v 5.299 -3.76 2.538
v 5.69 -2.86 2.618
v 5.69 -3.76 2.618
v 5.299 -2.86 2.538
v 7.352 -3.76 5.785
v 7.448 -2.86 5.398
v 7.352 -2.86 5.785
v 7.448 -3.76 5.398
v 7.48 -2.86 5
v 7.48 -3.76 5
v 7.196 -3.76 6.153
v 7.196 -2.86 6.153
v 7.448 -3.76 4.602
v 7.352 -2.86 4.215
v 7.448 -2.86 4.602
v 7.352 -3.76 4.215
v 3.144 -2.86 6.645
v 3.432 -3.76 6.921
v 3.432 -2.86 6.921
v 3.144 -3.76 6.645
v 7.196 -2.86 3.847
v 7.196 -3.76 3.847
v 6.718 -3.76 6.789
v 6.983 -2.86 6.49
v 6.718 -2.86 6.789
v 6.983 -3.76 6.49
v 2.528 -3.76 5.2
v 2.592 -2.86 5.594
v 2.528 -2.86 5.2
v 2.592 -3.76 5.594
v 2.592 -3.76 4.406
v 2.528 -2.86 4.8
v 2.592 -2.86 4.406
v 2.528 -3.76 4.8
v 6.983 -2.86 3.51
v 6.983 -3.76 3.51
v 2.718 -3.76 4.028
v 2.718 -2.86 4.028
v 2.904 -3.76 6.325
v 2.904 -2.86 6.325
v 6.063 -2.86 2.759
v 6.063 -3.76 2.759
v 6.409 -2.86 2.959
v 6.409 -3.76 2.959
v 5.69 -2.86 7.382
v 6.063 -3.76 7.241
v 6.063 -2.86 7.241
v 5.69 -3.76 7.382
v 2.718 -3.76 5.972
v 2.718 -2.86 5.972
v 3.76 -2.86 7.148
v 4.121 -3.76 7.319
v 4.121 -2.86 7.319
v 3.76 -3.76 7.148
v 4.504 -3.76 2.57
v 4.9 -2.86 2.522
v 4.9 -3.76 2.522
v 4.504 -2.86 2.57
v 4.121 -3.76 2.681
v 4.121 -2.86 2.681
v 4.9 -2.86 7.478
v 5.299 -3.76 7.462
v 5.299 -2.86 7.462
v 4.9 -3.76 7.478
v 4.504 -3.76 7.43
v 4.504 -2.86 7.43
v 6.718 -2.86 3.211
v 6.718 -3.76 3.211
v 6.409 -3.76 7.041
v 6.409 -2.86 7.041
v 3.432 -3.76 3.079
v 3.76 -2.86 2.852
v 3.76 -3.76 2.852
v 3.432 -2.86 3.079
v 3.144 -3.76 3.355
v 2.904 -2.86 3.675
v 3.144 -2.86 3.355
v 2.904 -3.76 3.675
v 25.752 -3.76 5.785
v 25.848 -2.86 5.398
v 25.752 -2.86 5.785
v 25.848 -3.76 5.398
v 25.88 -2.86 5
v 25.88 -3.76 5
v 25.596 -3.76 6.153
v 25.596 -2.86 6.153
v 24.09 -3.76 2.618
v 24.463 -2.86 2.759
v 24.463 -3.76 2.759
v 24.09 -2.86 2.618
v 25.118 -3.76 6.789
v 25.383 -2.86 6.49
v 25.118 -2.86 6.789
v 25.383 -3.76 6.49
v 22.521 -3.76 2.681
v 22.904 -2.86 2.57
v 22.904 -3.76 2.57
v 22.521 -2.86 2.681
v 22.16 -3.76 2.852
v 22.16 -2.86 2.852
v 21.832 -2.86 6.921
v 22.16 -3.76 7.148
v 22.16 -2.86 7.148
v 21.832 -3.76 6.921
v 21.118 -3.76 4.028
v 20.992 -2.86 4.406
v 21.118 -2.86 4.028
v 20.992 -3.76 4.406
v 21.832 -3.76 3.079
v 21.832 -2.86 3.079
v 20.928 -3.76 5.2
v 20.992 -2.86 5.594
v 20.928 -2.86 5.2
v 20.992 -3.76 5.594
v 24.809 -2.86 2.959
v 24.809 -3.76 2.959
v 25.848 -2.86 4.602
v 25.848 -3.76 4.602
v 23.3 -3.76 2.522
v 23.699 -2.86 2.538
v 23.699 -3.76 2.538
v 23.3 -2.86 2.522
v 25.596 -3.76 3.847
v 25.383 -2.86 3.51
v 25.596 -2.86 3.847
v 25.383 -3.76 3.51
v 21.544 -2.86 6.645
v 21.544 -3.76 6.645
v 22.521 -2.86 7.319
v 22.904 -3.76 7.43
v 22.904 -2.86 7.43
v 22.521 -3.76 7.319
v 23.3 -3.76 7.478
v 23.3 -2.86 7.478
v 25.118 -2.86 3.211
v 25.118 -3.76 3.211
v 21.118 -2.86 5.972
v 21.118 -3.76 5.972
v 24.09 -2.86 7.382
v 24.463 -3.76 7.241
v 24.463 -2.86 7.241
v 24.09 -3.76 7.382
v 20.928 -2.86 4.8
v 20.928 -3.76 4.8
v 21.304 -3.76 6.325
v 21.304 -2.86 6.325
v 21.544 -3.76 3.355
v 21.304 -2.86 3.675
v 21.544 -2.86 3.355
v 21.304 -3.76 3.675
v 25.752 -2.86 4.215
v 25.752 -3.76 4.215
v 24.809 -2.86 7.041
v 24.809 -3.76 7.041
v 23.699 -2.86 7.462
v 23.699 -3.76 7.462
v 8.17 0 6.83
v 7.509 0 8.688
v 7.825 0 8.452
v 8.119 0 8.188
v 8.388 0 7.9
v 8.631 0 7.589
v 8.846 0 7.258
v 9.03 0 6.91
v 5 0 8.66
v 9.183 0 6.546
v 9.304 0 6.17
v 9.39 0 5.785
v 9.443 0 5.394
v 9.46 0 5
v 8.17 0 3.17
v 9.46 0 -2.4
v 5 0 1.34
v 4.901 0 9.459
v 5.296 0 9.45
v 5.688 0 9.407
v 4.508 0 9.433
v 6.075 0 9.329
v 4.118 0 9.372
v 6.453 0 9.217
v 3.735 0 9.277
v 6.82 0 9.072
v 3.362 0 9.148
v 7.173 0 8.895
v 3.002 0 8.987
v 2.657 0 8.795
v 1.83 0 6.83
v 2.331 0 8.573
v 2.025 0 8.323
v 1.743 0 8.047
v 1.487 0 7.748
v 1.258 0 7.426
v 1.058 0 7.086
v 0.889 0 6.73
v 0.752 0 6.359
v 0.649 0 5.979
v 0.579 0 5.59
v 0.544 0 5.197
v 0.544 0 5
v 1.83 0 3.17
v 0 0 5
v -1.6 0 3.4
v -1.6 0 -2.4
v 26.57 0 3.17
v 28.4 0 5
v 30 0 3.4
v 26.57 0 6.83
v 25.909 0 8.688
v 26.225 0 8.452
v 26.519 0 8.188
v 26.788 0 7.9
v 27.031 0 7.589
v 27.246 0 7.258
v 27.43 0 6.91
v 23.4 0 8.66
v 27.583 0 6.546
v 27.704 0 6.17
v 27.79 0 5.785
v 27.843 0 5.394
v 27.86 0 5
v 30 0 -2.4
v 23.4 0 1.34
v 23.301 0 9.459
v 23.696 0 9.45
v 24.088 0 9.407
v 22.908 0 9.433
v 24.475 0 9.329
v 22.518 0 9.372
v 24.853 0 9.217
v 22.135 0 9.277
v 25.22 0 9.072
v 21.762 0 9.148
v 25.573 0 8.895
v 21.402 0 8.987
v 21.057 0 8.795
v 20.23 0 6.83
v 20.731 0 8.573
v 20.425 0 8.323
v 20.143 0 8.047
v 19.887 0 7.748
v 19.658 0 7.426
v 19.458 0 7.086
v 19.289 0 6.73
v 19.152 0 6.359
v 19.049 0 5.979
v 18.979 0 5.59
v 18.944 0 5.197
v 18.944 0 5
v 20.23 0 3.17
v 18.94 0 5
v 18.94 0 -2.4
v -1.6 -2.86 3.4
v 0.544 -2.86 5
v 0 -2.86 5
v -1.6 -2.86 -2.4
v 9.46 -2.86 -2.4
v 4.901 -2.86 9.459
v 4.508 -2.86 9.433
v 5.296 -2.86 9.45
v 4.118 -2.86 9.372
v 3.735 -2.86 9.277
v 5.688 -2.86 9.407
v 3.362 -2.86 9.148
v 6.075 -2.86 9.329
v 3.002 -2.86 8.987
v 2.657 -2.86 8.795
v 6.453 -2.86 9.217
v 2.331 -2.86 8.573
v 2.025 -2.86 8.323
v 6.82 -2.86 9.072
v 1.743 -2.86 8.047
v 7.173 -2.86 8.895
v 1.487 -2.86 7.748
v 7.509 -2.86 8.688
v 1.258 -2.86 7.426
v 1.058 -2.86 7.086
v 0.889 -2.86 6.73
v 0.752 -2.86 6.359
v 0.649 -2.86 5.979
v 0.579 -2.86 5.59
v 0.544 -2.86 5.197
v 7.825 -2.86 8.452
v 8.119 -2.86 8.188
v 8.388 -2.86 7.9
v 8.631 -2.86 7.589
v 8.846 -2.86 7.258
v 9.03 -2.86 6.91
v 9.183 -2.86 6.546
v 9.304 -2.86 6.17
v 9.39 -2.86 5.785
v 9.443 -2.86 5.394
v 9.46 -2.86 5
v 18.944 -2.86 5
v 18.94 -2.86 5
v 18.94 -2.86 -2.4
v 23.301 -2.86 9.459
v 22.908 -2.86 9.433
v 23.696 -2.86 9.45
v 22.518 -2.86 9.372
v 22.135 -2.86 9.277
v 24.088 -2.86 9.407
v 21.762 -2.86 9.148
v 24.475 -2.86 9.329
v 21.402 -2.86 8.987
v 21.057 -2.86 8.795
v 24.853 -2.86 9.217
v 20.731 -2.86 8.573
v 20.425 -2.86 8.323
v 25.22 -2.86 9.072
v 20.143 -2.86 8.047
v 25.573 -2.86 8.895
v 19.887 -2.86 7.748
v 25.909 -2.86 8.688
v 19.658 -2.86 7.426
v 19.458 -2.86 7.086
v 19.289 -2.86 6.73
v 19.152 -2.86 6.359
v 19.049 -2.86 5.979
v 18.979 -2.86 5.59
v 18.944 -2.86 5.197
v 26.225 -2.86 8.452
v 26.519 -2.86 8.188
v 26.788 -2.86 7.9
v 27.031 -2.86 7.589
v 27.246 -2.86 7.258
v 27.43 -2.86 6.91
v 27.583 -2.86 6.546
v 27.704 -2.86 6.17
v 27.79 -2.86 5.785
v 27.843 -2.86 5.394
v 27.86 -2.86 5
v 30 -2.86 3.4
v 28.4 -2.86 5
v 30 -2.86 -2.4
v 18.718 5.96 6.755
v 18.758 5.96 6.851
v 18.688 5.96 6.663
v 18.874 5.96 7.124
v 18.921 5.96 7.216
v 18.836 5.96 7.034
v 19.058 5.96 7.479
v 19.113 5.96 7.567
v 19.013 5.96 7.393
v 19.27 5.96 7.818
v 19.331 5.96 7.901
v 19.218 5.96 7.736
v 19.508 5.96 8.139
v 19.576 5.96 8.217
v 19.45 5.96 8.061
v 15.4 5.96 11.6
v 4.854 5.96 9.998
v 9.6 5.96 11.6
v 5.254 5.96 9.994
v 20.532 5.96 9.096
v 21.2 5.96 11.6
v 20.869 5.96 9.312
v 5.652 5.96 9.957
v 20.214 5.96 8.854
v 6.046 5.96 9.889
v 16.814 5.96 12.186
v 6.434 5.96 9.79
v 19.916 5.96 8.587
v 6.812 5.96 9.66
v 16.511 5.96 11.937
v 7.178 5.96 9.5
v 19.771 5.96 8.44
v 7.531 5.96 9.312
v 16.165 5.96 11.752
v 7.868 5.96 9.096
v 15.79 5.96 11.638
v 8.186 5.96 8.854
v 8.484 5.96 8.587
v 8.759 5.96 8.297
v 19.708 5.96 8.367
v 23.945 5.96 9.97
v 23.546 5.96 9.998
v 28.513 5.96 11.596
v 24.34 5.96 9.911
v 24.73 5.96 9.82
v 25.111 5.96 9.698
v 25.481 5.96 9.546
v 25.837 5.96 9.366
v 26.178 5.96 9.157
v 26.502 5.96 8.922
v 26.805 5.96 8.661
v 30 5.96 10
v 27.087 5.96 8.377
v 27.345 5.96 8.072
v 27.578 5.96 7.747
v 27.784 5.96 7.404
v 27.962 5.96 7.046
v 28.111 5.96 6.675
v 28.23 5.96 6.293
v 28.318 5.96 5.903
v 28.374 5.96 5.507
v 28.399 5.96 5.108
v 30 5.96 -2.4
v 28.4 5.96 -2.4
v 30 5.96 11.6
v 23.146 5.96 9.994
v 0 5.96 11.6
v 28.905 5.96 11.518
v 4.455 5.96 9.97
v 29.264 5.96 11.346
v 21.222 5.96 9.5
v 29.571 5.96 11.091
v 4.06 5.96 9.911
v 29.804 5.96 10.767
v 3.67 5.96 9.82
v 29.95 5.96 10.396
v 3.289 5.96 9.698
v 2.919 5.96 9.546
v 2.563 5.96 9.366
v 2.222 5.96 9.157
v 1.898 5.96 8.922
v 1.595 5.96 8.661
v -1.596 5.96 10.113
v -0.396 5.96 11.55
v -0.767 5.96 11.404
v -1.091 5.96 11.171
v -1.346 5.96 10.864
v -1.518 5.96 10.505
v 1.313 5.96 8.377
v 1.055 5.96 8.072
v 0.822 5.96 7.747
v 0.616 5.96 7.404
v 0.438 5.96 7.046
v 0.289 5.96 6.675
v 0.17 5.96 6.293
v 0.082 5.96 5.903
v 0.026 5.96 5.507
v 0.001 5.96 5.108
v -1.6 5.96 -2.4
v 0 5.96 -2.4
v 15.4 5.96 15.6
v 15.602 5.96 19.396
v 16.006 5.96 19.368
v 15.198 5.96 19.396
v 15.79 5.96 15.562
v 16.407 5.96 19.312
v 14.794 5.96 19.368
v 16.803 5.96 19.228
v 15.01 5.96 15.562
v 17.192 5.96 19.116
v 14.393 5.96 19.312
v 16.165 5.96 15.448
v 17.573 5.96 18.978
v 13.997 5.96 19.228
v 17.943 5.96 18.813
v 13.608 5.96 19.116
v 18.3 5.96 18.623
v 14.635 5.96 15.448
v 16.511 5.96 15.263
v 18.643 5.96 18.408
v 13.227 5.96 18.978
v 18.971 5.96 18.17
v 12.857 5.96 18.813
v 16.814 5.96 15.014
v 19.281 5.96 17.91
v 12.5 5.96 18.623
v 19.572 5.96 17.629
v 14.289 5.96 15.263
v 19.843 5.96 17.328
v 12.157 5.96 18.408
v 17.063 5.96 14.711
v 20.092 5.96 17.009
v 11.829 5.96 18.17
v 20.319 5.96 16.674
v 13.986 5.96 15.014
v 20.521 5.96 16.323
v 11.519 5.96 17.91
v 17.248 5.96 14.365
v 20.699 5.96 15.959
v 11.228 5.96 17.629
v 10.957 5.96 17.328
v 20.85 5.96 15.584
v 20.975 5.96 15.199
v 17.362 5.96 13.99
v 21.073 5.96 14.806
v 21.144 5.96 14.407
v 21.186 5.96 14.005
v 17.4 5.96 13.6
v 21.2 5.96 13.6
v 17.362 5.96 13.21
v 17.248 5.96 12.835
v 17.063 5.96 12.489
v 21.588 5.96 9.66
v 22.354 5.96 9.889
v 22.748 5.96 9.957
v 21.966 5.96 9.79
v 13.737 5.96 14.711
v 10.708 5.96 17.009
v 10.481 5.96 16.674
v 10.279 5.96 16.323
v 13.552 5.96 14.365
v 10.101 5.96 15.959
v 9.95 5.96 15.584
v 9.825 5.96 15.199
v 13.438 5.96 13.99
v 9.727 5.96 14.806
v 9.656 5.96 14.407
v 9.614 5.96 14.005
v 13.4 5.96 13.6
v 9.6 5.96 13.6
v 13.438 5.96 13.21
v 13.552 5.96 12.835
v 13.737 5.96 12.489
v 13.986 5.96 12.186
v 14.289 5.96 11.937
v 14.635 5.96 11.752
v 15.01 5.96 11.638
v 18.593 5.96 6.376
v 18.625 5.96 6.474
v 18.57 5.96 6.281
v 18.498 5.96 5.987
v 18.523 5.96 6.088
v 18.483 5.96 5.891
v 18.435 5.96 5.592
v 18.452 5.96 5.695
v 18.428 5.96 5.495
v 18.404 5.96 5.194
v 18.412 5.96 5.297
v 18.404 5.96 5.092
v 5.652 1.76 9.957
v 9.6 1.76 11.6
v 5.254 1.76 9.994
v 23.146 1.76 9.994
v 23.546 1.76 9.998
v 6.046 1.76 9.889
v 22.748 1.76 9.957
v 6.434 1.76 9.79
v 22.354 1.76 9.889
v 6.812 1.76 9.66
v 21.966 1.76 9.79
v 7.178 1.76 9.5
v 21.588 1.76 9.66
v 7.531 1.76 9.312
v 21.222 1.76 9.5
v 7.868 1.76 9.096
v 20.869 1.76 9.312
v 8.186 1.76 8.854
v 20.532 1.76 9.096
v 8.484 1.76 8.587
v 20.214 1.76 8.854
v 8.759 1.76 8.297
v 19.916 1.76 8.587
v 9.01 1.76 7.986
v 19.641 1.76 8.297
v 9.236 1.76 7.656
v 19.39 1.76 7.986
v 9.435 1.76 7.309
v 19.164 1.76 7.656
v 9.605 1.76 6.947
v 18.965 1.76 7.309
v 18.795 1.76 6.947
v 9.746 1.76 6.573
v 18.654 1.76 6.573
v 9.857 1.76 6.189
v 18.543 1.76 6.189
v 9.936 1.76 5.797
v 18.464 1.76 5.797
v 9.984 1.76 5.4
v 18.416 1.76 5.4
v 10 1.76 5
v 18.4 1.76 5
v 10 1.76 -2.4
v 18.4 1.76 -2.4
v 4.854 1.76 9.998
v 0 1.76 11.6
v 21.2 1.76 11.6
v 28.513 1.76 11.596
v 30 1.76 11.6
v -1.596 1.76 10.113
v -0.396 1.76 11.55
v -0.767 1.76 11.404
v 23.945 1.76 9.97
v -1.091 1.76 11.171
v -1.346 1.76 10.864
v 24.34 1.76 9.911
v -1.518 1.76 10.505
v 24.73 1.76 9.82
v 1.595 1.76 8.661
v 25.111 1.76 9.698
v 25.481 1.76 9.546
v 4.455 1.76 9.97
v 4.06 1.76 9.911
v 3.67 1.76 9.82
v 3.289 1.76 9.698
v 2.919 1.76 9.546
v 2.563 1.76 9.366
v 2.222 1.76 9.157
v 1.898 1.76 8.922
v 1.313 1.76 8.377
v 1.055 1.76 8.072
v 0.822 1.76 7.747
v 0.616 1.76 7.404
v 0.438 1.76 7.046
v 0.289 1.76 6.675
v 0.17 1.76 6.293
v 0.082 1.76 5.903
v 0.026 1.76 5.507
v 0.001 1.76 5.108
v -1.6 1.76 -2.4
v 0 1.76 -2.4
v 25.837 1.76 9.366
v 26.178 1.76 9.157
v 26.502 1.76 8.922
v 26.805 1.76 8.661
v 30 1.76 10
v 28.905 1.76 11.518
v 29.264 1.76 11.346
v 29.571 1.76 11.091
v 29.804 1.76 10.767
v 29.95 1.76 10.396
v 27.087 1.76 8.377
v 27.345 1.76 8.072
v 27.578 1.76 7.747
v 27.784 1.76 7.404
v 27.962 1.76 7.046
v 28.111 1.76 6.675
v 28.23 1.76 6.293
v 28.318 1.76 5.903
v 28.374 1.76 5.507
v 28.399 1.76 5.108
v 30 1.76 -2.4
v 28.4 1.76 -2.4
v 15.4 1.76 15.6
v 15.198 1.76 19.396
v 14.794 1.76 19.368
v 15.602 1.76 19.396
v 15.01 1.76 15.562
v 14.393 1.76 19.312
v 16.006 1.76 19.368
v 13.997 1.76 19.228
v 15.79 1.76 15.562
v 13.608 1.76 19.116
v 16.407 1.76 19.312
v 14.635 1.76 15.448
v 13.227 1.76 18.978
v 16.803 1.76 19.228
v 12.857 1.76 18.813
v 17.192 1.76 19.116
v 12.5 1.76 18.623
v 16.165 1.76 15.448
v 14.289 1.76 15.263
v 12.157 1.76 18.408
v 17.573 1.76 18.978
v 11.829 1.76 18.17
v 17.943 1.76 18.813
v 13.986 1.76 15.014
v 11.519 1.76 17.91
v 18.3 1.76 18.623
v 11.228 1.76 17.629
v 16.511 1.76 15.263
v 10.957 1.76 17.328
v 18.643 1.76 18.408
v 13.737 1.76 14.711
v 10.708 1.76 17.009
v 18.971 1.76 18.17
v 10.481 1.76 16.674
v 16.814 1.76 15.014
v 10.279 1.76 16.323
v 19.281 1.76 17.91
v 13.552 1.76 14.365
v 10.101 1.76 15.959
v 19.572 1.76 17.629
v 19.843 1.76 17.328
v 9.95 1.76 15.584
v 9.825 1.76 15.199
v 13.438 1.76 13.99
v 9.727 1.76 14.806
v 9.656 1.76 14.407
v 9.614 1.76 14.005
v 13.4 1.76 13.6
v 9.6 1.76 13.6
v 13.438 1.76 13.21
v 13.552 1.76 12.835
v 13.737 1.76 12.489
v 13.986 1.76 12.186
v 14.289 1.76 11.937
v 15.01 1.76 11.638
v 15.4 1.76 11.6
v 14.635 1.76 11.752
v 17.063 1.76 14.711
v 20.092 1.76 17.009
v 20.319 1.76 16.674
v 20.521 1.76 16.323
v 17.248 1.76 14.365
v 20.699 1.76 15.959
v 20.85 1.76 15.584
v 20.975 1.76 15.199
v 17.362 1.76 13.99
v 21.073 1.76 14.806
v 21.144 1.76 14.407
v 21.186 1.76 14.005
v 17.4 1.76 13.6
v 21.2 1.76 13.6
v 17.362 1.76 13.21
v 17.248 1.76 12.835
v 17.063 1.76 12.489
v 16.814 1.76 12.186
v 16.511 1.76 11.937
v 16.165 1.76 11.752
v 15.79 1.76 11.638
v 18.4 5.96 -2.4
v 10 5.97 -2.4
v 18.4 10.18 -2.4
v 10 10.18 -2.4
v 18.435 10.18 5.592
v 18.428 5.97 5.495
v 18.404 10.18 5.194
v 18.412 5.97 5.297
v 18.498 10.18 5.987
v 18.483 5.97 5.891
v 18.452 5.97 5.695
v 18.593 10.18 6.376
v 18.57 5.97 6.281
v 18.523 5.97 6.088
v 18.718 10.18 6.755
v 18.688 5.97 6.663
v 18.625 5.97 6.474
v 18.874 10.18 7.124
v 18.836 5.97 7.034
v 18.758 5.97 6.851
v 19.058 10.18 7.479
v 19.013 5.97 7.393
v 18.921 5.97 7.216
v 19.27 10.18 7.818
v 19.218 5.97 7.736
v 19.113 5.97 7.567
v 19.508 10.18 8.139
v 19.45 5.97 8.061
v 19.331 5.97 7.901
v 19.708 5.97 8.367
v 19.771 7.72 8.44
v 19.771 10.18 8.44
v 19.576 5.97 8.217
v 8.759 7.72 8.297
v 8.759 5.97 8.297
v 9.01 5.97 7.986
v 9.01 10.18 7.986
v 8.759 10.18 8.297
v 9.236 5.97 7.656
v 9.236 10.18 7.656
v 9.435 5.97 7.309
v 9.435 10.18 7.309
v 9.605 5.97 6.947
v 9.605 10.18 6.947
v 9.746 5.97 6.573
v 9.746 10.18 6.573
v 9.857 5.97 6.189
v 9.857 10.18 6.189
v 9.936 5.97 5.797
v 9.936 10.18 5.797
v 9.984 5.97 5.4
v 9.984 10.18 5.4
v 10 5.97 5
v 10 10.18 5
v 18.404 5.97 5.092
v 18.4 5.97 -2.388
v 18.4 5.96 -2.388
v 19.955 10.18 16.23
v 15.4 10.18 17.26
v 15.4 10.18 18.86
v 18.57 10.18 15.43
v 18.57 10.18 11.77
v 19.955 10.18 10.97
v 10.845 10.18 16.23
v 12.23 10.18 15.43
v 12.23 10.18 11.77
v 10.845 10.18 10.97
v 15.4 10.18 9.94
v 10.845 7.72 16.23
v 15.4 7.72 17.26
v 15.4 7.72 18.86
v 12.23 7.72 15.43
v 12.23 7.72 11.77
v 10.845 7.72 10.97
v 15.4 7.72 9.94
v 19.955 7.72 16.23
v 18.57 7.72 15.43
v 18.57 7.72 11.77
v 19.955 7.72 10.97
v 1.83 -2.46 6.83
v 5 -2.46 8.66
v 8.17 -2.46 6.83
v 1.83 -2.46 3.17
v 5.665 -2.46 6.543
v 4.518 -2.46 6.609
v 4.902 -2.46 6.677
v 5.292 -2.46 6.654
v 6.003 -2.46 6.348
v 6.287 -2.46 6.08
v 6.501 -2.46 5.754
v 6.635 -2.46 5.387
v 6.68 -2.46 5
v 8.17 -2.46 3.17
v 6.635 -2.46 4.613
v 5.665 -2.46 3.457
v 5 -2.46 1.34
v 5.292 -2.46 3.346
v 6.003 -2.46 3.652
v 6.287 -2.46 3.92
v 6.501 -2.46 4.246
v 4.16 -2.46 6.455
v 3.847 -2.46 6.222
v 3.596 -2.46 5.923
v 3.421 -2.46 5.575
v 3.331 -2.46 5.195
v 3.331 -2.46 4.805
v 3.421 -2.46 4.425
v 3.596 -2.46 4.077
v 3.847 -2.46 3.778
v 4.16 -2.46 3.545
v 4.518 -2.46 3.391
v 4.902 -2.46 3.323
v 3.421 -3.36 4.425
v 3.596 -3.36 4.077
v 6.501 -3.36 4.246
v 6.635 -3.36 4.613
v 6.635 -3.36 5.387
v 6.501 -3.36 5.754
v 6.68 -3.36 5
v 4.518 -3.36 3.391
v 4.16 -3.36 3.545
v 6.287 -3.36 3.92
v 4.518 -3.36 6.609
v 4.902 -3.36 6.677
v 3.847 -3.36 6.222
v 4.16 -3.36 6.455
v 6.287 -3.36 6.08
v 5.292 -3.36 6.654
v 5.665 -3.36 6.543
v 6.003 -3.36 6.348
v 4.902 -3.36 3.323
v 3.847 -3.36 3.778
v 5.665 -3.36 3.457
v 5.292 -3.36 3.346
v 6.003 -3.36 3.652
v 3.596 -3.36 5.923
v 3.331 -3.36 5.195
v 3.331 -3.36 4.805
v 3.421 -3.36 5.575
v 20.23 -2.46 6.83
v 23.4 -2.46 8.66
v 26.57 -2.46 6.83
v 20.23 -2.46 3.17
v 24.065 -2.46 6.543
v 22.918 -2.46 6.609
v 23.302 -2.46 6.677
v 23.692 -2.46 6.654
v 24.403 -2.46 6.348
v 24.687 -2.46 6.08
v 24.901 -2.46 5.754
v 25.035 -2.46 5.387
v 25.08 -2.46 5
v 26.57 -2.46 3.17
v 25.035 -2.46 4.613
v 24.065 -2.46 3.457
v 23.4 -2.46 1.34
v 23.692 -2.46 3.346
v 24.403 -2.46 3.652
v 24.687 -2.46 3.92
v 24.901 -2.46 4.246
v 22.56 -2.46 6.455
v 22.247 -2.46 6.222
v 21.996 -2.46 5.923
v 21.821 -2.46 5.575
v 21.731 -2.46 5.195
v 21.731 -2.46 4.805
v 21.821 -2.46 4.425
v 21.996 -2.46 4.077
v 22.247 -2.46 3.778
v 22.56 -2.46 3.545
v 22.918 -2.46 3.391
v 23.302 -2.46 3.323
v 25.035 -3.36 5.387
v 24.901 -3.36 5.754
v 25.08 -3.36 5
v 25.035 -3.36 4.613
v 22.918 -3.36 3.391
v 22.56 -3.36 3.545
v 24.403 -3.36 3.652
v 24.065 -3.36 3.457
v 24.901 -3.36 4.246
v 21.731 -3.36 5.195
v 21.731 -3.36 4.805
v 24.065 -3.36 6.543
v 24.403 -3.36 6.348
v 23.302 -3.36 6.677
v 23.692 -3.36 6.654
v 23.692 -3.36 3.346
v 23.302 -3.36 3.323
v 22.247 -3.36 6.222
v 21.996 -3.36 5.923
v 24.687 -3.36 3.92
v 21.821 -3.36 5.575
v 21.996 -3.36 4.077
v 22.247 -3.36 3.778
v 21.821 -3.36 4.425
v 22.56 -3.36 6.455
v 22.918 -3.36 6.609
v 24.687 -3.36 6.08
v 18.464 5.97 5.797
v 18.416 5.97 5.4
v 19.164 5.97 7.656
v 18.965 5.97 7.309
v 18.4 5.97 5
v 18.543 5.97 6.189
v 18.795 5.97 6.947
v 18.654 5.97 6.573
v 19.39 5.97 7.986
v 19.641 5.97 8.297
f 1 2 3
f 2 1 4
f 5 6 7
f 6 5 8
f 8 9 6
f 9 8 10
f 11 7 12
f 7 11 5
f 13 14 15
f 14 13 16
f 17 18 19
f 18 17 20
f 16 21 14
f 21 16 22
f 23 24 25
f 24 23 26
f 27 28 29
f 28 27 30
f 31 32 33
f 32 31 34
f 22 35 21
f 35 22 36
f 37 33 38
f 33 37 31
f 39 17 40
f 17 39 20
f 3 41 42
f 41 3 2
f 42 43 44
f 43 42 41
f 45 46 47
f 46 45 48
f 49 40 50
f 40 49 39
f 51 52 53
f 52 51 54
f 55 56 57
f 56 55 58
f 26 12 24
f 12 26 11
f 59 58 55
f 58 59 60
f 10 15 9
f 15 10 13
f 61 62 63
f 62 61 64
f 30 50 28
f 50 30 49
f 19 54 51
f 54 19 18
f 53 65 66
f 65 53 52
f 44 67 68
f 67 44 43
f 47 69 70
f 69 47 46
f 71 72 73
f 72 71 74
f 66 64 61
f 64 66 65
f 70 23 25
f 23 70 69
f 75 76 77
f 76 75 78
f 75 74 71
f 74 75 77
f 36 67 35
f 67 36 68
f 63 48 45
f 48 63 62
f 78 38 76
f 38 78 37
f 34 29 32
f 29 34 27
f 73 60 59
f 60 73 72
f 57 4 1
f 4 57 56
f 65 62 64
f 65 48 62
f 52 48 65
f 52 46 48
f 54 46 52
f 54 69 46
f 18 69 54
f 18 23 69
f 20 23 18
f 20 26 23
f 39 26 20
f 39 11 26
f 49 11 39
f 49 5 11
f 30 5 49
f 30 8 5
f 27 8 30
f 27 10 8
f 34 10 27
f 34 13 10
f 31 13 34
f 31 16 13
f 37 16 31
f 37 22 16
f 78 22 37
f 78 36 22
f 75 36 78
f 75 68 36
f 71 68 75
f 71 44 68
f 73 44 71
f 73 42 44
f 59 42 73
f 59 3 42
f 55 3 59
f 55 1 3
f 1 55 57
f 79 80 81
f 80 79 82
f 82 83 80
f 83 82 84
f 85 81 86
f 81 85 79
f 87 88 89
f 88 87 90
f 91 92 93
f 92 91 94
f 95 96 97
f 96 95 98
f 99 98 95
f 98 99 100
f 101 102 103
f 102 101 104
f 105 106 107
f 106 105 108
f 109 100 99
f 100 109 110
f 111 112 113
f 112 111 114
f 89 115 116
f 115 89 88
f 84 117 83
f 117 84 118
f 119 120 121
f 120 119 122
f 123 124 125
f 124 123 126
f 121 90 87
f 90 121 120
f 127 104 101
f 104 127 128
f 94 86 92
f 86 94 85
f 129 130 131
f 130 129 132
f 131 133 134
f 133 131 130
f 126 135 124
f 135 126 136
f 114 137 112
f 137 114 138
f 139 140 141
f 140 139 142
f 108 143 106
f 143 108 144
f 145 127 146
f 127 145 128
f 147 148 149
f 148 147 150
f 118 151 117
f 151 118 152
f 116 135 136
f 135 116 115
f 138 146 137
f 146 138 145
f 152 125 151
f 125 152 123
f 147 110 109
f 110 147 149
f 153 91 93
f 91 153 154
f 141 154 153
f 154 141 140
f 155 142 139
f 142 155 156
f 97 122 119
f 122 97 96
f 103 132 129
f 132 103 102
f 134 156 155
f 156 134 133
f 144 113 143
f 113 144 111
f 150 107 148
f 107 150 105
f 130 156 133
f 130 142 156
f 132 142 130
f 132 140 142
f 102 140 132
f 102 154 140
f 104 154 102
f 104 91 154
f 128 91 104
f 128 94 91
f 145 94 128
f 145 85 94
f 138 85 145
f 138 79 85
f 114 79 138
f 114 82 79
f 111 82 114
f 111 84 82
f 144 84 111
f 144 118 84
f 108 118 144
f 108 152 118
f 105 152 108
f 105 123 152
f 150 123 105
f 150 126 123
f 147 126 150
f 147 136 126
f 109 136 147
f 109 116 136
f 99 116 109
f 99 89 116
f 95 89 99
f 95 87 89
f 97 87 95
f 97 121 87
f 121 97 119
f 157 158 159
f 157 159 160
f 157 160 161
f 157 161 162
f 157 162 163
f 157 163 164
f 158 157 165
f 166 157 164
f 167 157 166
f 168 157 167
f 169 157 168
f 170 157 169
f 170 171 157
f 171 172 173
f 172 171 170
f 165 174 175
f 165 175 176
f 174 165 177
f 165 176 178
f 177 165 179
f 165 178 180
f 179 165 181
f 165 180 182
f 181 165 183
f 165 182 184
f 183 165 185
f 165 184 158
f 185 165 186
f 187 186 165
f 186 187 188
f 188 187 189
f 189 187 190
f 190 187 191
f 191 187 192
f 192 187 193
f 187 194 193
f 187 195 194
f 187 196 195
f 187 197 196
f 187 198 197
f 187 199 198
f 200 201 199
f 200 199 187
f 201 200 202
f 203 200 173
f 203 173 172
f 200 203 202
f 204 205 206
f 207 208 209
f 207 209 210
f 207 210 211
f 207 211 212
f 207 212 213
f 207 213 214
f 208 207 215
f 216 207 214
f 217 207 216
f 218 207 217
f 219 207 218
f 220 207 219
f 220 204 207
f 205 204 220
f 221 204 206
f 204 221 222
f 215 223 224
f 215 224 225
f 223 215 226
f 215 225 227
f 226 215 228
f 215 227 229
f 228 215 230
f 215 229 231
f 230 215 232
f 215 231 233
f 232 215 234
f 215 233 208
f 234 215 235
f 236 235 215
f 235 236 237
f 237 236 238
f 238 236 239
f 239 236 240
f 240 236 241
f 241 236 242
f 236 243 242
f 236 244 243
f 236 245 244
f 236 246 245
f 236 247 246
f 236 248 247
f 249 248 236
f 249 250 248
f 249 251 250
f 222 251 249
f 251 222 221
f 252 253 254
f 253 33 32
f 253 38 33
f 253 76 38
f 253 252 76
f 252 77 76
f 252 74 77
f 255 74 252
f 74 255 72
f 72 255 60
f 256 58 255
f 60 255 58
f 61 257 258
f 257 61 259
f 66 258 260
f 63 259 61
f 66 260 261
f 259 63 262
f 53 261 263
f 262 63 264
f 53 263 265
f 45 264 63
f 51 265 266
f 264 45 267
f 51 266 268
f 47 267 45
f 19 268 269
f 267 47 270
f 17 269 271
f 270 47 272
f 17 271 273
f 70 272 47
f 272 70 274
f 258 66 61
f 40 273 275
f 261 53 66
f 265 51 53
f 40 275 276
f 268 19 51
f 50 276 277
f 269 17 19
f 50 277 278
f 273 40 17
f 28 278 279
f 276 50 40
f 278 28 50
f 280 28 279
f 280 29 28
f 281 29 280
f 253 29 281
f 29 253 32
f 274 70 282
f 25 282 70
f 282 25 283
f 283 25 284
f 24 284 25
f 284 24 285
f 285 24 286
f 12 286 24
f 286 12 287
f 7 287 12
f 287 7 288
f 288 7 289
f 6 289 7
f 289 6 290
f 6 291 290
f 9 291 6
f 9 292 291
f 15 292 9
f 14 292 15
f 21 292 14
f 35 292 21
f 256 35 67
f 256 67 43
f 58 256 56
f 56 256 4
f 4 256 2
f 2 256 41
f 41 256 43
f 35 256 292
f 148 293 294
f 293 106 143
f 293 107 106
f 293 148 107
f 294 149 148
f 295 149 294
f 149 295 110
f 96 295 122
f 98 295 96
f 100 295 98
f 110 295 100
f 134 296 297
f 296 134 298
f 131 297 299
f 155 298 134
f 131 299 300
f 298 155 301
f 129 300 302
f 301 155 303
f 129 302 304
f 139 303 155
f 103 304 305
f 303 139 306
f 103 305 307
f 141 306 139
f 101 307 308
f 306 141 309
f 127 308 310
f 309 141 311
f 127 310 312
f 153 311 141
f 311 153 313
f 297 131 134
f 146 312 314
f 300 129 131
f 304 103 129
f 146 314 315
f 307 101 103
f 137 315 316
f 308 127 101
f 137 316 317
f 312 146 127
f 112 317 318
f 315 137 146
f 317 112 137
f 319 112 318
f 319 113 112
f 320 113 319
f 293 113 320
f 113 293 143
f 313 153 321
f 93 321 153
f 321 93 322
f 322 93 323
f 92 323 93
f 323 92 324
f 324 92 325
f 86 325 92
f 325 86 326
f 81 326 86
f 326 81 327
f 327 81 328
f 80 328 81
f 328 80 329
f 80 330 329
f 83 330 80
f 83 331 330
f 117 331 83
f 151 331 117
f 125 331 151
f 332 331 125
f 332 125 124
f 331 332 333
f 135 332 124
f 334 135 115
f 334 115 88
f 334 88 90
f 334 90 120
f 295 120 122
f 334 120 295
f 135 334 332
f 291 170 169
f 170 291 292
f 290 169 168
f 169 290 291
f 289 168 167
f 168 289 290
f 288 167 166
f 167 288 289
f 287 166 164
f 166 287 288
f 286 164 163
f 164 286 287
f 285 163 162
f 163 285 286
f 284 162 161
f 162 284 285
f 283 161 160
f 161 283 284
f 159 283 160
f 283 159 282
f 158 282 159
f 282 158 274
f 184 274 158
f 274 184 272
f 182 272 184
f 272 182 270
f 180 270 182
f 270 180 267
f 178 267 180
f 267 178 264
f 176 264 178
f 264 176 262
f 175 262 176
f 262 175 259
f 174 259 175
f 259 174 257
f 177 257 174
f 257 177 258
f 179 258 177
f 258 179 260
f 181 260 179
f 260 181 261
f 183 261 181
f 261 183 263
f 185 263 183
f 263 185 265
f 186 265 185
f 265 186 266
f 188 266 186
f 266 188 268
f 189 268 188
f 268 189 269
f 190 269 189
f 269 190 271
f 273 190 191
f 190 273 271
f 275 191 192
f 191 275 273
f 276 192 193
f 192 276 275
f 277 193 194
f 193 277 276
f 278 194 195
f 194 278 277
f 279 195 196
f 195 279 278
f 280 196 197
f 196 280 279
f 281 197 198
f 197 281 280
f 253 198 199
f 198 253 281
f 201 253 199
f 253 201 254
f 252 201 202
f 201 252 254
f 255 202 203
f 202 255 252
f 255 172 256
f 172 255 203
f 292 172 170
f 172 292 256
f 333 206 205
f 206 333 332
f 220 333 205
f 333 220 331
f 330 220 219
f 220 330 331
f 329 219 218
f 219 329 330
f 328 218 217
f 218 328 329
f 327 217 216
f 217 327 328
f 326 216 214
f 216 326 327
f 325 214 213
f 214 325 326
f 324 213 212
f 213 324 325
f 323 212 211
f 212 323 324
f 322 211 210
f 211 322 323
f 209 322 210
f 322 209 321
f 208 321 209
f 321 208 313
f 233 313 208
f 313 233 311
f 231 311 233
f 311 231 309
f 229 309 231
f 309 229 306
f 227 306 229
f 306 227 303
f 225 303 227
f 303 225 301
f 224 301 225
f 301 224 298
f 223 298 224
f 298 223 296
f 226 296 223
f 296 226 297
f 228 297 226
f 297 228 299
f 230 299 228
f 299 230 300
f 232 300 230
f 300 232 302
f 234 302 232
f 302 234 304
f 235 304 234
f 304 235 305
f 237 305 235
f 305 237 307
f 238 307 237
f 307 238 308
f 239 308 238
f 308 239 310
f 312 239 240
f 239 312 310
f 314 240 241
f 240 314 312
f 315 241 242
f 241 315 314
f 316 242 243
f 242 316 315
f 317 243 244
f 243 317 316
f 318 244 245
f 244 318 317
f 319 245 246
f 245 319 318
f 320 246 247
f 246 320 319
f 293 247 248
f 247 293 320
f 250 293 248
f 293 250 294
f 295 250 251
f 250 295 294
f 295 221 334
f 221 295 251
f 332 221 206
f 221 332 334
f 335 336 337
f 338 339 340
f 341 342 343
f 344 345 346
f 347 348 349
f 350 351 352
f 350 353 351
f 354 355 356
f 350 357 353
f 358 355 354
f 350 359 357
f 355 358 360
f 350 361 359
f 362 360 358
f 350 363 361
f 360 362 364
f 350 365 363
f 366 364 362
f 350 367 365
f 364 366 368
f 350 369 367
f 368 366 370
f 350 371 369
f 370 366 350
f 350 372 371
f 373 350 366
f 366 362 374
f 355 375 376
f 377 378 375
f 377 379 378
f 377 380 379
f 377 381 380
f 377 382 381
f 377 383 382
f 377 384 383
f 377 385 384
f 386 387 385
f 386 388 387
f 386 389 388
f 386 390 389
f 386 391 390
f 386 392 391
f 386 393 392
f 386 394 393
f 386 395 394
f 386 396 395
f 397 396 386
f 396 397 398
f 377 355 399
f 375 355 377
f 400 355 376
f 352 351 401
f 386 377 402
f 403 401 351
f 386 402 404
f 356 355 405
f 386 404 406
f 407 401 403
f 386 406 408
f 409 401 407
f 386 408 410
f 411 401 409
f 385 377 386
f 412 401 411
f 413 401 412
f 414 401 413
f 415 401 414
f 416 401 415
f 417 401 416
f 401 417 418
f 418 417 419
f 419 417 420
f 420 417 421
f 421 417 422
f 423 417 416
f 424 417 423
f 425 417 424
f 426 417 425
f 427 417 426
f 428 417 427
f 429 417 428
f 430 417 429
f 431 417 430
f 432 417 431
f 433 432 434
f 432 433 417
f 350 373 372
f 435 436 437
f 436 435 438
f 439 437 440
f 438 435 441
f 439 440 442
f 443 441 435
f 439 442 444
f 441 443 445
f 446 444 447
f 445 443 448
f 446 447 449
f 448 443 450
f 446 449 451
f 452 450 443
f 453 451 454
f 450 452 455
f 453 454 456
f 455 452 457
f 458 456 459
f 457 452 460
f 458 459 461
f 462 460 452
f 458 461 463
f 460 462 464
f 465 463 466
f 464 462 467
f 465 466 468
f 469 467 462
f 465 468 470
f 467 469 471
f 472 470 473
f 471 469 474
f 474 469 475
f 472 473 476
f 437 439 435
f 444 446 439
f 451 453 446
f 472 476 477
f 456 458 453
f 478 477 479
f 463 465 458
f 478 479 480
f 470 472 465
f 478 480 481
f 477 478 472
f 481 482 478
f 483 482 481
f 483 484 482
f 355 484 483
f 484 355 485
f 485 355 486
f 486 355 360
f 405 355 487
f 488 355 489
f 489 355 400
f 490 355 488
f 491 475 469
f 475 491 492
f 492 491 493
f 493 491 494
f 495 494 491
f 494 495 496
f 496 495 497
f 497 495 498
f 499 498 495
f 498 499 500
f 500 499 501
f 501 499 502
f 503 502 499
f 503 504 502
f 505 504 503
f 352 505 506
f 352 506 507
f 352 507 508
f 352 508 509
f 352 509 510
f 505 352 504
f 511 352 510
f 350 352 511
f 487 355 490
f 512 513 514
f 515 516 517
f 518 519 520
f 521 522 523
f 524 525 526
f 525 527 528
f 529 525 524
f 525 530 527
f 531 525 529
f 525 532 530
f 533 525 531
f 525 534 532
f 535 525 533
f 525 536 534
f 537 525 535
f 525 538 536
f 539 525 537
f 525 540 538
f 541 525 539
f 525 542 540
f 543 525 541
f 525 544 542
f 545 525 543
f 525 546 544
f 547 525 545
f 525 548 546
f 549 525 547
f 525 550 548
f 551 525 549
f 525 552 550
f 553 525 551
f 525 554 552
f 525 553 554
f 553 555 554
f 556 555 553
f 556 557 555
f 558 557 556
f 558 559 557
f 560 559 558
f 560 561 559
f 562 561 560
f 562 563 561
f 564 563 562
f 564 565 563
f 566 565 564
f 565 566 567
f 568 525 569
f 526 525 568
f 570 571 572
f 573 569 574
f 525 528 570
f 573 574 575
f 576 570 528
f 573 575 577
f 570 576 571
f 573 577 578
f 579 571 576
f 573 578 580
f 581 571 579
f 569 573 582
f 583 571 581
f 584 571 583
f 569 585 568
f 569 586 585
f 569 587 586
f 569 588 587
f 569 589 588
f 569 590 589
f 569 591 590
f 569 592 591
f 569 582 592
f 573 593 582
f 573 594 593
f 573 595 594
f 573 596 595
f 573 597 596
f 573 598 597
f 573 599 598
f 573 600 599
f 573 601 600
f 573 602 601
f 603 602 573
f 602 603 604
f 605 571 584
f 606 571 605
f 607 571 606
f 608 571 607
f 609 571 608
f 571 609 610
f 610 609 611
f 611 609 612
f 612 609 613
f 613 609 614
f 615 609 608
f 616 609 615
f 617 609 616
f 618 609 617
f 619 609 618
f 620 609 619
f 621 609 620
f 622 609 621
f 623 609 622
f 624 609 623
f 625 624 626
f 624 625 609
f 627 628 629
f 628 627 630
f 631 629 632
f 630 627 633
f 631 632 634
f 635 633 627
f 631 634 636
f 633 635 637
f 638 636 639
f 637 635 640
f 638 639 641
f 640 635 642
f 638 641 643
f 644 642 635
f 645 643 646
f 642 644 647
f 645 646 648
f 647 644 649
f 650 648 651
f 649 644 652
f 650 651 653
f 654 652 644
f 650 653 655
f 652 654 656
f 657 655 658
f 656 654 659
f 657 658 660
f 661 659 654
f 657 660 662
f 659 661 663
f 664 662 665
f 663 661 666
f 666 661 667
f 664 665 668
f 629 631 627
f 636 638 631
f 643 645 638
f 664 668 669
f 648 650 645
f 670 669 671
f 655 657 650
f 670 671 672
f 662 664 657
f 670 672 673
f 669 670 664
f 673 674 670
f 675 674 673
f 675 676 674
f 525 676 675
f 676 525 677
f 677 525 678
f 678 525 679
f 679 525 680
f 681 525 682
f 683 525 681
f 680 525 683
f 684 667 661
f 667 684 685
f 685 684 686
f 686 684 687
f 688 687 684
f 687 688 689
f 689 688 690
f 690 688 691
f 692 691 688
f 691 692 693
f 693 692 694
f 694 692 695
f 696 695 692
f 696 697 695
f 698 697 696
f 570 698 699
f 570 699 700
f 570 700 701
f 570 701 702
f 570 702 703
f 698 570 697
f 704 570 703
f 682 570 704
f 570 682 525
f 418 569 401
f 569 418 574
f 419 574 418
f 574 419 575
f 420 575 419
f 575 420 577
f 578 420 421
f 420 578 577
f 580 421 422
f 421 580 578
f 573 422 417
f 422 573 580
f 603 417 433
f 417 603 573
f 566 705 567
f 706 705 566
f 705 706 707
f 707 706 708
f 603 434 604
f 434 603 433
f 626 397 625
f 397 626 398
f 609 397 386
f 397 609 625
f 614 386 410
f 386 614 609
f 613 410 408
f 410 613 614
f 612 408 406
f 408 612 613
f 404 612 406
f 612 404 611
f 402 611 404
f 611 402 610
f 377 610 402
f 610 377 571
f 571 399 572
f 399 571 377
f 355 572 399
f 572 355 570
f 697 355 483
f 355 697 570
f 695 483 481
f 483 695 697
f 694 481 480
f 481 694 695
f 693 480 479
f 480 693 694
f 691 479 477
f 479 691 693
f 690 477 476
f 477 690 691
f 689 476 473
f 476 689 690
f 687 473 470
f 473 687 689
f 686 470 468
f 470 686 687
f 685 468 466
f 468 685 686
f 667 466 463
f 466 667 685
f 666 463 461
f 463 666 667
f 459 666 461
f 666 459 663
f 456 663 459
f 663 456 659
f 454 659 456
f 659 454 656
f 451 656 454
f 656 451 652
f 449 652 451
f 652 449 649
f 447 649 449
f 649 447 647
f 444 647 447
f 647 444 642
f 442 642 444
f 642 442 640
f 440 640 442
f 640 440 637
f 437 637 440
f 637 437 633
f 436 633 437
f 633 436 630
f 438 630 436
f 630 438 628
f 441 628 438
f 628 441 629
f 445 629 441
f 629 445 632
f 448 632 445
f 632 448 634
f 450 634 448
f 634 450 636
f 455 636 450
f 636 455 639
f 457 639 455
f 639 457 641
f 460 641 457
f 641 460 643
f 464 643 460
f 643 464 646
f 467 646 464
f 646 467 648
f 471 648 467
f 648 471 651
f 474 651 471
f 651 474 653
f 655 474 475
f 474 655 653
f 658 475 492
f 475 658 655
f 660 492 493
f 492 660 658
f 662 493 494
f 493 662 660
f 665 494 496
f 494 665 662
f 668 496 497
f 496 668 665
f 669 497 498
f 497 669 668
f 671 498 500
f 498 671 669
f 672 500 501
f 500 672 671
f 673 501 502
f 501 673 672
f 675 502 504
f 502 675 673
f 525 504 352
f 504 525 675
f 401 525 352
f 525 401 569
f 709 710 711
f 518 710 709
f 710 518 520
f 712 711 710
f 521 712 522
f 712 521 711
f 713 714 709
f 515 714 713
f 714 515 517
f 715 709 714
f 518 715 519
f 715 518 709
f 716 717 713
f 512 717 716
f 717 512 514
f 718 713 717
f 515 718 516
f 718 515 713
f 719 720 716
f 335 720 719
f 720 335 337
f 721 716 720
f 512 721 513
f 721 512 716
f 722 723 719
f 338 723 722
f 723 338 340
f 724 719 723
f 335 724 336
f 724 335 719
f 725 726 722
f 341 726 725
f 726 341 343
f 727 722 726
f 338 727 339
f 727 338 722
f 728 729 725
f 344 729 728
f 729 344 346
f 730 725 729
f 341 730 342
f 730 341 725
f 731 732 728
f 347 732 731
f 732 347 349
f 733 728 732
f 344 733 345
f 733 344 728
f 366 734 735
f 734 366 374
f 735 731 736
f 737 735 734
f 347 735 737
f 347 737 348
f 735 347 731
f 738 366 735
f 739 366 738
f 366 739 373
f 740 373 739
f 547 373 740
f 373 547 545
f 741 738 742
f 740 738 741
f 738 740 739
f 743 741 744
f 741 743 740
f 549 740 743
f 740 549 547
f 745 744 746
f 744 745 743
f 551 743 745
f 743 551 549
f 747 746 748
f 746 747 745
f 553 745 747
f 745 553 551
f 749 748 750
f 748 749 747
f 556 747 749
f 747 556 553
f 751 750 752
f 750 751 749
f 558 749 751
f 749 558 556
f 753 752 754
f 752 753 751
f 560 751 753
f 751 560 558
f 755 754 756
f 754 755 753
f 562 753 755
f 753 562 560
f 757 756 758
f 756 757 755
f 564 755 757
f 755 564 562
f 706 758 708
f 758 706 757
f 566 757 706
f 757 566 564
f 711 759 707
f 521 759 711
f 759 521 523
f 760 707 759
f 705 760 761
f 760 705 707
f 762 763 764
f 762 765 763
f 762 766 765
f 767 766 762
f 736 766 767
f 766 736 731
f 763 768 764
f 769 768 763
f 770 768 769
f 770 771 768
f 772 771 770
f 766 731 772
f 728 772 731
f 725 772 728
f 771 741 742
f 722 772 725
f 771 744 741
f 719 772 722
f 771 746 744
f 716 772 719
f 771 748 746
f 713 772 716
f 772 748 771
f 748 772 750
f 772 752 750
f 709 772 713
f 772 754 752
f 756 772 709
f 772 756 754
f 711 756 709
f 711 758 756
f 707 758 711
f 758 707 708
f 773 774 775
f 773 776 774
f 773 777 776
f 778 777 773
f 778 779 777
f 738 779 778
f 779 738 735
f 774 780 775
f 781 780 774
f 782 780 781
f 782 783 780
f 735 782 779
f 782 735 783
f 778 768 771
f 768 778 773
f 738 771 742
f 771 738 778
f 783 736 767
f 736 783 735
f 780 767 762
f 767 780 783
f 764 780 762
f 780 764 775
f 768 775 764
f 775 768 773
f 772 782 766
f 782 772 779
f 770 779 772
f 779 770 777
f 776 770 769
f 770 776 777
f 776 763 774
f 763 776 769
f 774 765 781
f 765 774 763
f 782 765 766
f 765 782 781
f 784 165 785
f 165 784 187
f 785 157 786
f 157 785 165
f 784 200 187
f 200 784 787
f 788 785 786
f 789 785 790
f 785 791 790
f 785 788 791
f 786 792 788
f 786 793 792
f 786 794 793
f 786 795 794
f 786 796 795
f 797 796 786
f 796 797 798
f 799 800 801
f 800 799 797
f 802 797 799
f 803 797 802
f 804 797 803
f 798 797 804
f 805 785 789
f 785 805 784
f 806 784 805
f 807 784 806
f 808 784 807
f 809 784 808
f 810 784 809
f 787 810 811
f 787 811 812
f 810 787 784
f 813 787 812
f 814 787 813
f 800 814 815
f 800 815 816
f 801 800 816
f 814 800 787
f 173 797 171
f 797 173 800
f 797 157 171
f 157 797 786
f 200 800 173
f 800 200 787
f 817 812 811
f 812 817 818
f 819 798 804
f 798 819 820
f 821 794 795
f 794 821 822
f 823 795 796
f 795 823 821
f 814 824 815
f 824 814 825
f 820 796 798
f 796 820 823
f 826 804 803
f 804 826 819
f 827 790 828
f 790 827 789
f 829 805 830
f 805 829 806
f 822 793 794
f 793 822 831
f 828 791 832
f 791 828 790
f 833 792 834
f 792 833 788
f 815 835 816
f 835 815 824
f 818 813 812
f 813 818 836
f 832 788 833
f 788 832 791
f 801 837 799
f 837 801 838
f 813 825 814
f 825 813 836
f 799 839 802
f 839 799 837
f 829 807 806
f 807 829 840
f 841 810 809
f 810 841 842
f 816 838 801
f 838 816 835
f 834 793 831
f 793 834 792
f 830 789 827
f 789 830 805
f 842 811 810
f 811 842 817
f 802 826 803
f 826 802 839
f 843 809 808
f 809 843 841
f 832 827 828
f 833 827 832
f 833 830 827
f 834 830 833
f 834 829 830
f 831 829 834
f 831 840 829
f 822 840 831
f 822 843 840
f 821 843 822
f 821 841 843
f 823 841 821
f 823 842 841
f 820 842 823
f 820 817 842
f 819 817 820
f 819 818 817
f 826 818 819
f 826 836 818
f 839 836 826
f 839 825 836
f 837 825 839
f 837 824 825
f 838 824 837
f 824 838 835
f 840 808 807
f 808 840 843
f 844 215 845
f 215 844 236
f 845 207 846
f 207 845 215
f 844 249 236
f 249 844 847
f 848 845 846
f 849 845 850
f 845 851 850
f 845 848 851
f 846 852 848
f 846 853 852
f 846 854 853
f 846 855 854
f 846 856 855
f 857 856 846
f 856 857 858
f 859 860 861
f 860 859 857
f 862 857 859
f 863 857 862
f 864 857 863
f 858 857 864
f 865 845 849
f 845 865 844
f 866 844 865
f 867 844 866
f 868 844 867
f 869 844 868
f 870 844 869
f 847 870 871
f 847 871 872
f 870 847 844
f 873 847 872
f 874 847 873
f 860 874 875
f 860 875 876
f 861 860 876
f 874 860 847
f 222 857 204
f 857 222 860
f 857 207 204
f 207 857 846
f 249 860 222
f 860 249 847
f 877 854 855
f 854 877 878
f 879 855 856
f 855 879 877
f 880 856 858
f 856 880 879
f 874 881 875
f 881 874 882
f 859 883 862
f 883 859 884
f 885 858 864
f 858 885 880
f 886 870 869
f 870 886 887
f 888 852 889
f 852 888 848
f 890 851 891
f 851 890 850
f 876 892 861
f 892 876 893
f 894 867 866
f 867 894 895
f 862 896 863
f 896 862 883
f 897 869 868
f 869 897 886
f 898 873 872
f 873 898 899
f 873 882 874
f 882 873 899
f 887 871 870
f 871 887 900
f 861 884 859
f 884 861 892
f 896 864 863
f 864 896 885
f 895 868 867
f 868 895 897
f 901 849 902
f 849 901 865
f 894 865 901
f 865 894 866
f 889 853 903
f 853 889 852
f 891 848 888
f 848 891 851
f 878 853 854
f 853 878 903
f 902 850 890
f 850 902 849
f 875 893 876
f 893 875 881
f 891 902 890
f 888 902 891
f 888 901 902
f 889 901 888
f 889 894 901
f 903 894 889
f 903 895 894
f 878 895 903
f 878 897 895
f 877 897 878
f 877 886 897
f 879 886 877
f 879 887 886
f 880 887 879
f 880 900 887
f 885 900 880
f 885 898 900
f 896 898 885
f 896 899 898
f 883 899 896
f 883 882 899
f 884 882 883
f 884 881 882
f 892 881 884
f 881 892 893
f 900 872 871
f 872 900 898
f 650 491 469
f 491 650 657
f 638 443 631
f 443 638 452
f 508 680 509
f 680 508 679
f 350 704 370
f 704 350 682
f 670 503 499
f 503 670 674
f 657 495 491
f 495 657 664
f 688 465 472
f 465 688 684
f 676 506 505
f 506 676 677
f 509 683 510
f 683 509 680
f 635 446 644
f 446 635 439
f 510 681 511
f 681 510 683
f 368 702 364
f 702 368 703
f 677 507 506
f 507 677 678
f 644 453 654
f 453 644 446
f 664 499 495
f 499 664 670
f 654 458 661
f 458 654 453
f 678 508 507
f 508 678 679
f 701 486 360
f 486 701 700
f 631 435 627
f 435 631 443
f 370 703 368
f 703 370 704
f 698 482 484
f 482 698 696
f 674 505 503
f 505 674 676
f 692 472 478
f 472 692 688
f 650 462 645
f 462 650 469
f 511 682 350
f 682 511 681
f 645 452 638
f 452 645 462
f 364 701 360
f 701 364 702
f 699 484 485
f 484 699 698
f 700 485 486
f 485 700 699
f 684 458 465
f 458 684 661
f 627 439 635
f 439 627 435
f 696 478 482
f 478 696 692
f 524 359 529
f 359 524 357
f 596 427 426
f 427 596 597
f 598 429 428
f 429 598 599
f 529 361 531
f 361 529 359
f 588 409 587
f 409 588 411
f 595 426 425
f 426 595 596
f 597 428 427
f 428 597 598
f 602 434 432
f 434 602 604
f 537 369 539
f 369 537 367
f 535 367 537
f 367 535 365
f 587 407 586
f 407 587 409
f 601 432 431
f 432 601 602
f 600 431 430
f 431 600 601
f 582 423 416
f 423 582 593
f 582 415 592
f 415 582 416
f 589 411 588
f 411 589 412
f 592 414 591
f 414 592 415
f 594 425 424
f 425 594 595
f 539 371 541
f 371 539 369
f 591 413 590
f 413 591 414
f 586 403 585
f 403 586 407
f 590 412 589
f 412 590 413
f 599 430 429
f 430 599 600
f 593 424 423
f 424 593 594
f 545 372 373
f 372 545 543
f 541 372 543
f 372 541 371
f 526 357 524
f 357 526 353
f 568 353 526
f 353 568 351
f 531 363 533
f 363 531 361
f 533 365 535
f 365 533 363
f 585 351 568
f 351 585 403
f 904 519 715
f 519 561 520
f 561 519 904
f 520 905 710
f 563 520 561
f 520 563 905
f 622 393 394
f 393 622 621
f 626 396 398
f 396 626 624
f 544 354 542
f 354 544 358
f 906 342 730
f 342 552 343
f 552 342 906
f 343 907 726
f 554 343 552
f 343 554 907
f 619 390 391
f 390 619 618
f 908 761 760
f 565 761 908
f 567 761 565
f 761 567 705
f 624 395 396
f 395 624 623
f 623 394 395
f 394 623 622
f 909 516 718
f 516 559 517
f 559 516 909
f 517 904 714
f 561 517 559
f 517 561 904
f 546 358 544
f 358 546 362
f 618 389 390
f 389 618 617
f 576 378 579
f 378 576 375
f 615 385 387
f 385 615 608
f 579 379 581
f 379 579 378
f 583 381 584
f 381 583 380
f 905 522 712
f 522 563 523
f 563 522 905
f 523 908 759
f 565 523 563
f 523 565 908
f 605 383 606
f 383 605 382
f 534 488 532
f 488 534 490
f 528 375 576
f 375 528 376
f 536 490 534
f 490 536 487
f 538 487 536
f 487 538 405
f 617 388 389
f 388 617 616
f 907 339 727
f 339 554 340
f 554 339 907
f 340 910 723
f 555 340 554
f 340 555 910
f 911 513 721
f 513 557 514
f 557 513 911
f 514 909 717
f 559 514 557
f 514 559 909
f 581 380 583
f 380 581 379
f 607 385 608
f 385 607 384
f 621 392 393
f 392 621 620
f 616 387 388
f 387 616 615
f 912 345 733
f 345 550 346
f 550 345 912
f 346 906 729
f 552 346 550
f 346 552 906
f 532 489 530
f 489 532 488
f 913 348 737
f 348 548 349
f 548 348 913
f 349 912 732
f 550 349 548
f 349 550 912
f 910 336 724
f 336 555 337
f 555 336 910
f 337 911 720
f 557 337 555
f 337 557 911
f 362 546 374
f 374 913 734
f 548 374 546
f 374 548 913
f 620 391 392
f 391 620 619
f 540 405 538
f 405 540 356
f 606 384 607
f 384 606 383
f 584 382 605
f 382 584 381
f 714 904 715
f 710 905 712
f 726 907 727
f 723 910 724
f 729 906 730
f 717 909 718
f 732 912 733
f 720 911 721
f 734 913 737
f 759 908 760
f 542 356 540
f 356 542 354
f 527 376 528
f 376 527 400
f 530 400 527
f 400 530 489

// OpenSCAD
// Copyright (C) 2025 Arif K. Rafiq
// This program is free software: you can redistribute it and/or modify
// it under the terms of the GNU General Public License as published by
// the Free Software Foundation, either version 3 of the License, or
// (at your option) any later version.

// This program is distributed in the hope that it will be useful,
// but WITHOUT ANY WARRANTY; without even the implied warranty of
// MERCHANTABILITY or FITNESS FOR A PARTICULAR PURPOSE.  See the
// GNU General Public License for more details.

// You should have received a copy of the GNU General Public License
// along with this file.  If not, see <https://www.gnu.org/licenses/>,
// or write to: license@temperedoptimism.com


/* 
(b)readth       :(w)est (X-)   (c)enter (X0) (e)east (X+)
(h)eight        :(d)own (Z-)   (g)round(Z0)  (u)p (Z+)

Vectors (v)     :(x), (y), (z)
Thicknesses (t) : Thicknesses to resolve 3D printer limits or rendering issues.
Proportion (p)  : container for grouping (r)adius and (i)ntensity into a singl 2d vector acccessed using .x and .y respectively
*/
/* 17:08 */
// Fixed in example3.scad       // Set limits in customizer
/* [Thicknesses (x),(y),(z)] */
tFitGap = [0.16, 0.16, 0.16];   //[0.00:0.01:0.64] 
tWallMin = [0.40, 0.40, 0.16];  //[0.16:0.08:1.60] 
/* [Proportional (x):(Radius, (y):(i)ntensity] */
pHexSink = [3.5, 2.3];          //[0.10:0.02:20.00] 
pFastShaft064 = [1.36, 5.80]; //0.10:0.02:20.00]
pFastShaft095 = [1.36, 9.30]; //0.10:0.02:20.00]
pWashSink = [4.00, 1.00]; //0.10:0.02:20.00]
/* [2D vectors (x), (y)] */
vTerminalW = [5.0, 5.0];     //[0.00:0.10:100] 
vTerminalE = [23.4, 5.0];    //[0.00:0.10:100]
vThermal = [ 15.4, 13.6];    //[0.00:0.10:100.00]
/* [Scalars] */
yControllerThermal=5.0; //[5.0:0.1:8.4]
leadingEdge = 2.4; //[0.8:0.4:5.0]
flankEdge = 1.6; //[0.8:0.4:5.0]
trailingEdge = 1.6; //[0.8:0.4:3.6]
hBoardDriver = 28.4; //[20:0.1:100.0]
hBoard = 1.6; //0.8:04:3.2]
hBoardController = 1.6; //[0.8:04:3.2]
// Adding space
hSpacer = 4.2; //[2.8:0.4:14]
rCorner = 1.6; //0.1
rTerminal = 5.0; //0.1
rThermal = 5.0;  //0.1
/* [Special ] */
fa0 = 4.0;     //[1:1:60]  
fs0 = 0.4;     //[0.1:0.1:4.0]  
fx0 = 3;       //[1,2,3,4,5,6,7,8,9,10]
/* [Hidden] */ 
tEps=0.01; 

/* Calucualted at run time. */
pHexSurround = [pHexSink.x + (tWallMin.x * 2) + tFitGap.x, pHexSink.y + tWallMin.y + tFitGap.y];
pExtension = [pFastShaft064.x + ((tWallMin.x + tFitGap.x)* 2), pFastShaft064.y + tWallMin.y + tFitGap.y - pHexSurround.y -hBoard - pWashSink.y];
aControllerRest= asin((vThermal.y - yControllerThermal - tFitGap.z - vTerminalW.y)/rThermal);

//30.00-35.00 Circles, Also look at the customizer!!
// Rotate
rotate([90,0,0]){
  difference(){
    union() {
      // hex pocket surround
      linear_extrude(pHexSurround.y, convexity=fx0){ 
        polygon([[vTerminalW.x + pHexSurround.x, vTerminalW.y],
              [ vTerminalW.x + pHexSurround.x, -leadingEdge],
              [-flankEdge, -leadingEdge],
              [-flankEdge, vTerminalW.y - rCorner],
              [-flankEdge + rCorner, vTerminalW.y]]);
        polygon([[vTerminalE.x - pHexSurround.x, vTerminalE.y],
              [ vTerminalE.x - pHexSurround.x, -leadingEdge],
              [hBoardDriver + flankEdge, -leadingEdge],
              [hBoardDriver + flankEdge, vTerminalE.y - rCorner],
              [hBoardDriver + flankEdge - rCorner, vTerminalE.y]]);       
              
        for(v = [vTerminalW, vTerminalE]){
          translate(v)  circle(pHexSurround.x, $fa=fa0, $fs=fs0 );
        }
      }
      // shaft extension
      for(v= [vTerminalW, vTerminalE]){
          translate([v.x, v.y, pHexSurround.y - tEps]) cylinder(pExtension.y + tEps, r=pExtension.x, $fa=fa0, $fs=fs0);
      }
      // board spacer
      translate([0, 0, -hBoard - tFitGap.y - hSpacer]) linear_extrude(hSpacer, convexity=fx0){
          polygon([[-flankEdge, -leadingEdge],
          [hBoardDriver + flankEdge, -leadingEdge],
          for(a = [0:max(fa0,(fs0*360)/(2*PI*rCorner)):90]) [rCorner *cos(a), rCorner *sin(a)] + [hBoardDriver + flankEdge - rCorner, vTerminalE.y + rTerminal + trailingEdge - rCorner ],
          [hBoardDriver + flankEdge, vTerminalE.y + rTerminal + trailingEdge],
          [vThermal.x + rThermal +(tWallMin.x * 2), vTerminalE.y + rTerminal + trailingEdge],
          [vThermal.x + rThermal +(tWallMin.x * 2), vThermal.y],
          [vThermal.x - rThermal -(tWallMin.x * 2), vThermal.y],
          [vThermal.x - rThermal -(tWallMin.x * 2), vTerminalW.y + rTerminal + trailingEdge],
          [-flankEdge, vTerminalW.y + rTerminal + trailingEdge],
          for(a = [90:max(fa0,(fs0*360)/(2*PI*rCorner)):180]) [rCorner *cos(a), rCorner *sin(a)] + [-flankEdge + rCorner, vTerminalW.y + rTerminal + trailingEdge - rCorner ]]);
          translate(vThermal) circle(rThermal + (tWallMin.x * 2), $fa=fa0, $fs=fs0);
      }
    // controller rest
      
    #translate([0,0, -hBoard - tFitGap.y - hSpacer - hBoardController - tFitGap.y - (tEps*2)]) linear_extrude(hBoardController + tFitGap.y +(tEps*2), convexity=fx0) {
       polygon([[vTerminalW.x + rTerminal, - leadingEdge],
       for(a = [0:max(fa0,(fs0*360)/(2*PI*rTerminal)):aControllerRest]) [rTerminal *cos(a), rTerminal *sin(a)] +vTerminalW,
       for(a = [180 -aControllerRest:max(fa0,(fs0*360)/(2*PI*rTerminal)):180]) 
    [rTerminal *cos(a), rTerminal *sin(a)] +vTerminalE,
       [vTerminalE.x - rTerminal, -leadingEdge]]);
     }
     // thermal hex pocket
translate([0, 0, -hBoard -tFitGap.y -hSpacer -hBoardController -tFitGap.y -pHexSink.y -tFitGap.y]) linear_extrude(pHexSink.y +tFitGap.y, convexity=fx0) {
    polygon([for(a = [90:-60:-30]) [(pHexSink.x +tFitGap.x +(tWallMin.x *4)) *cos(a), (pHexSink.x +tFitGap.x +(tWallMin.x *4)) *sin(a)] +vThermal
        ,for(a = [180 -aControllerRest:max(fa0,(fs0*360)/(2*PI*rTerminal)):180]) [rTerminal *cos(a), rTerminal *sin(a)] +vTerminalE
        ,[vTerminalE.x -rTerminal, -leadingEdge]
        ,[vTerminalW.x +rTerminal, -leadingEdge]
        ,for(a = [0:max(fa0,(fs0*360)/(2*PI*rTerminal)):aControllerRest]) [rTerminal *cos(a), rTerminal *sin(a)] +vTerminalW
        ,for(a = [210:-60:90]) [(pHexSink.x +tFitGap.x +(tWallMin.x *4)) *cos(a), (pHexSink.x +tFitGap.x +(tWallMin.x *4)) *sin(a)] +vThermal
            ,for(a=[90:60:450]) [(pHexSink.x +tFitGap.x) *cos(a), (pHexSink.x +tFitGap.x) * sin(a) ] +vThermal
    ]);
        
} 
    }
      
    for(v = [vTerminalW, vTerminalE]){
        // hex pocket
        #translate([v.x, v.y, -tEps]) rotate([0,0,30]) cylinder(pHexSurround.y - tWallMin.y + tEps, r=pHexSurround.x - (tWallMin.x * 2), $fn=6);
        // fastner hole
        #translate([v.x, v.y, -hBoard -pWashSink.y]) cylinder(pFastShaft064.y + tFitGap.y, r=pFastShaft064.x + (tFitGap.x * 2), $fa=fa0, $fs=fs0);
     
    }
   #translate([vThermal.x, vThermal.y, -hBoard + pWashSink.y]) rotate([0,180,0]) 
        cylinder(pFastShaft095.y + tFitGap.y, r=pFastShaft095.x + (tFitGap.x * 4), $fa=fa0, $fs=fs0);

    // terminal guide
   #translate([vTerminalW.x, vTerminalW.y, -hBoard - tFitGap.y -hSpacer -tEps ]) linear_extrude(hSpacer + (tEps *2), convexity=fx0) {
        polygon([for(a = [0:max(fa0, (fs0*360)/(2*PI*rTerminal)):180]) [rTerminal * cos(a), rTerminal *sin(a)]
        ,[-rTerminal, -vTerminalW.y -leadingEdge -tEps]
        ,[rTerminal, -vTerminalW.y -leadingEdge -tEps]]);
   }
   /* Mirror */
   #translate([vTerminalE.x, vTerminalE.y, -hBoard - tFitGap.y -hSpacer -tEps ]) linear_extrude(hSpacer + (tEps *2), convexity=fx0) {
        mirror([1,0,0]) 
        polygon([for(a = [0:max(fa0, (fs0*360)/(2*PI*rTerminal)):180]) [rTerminal * cos(a), rTerminal *sin(a)]
        ,[-rTerminal, -vTerminalW.y -leadingEdge -tEps]
        ,[rTerminal, -vTerminalW.y -leadingEdge -tEps]]);
   }
  }
}
